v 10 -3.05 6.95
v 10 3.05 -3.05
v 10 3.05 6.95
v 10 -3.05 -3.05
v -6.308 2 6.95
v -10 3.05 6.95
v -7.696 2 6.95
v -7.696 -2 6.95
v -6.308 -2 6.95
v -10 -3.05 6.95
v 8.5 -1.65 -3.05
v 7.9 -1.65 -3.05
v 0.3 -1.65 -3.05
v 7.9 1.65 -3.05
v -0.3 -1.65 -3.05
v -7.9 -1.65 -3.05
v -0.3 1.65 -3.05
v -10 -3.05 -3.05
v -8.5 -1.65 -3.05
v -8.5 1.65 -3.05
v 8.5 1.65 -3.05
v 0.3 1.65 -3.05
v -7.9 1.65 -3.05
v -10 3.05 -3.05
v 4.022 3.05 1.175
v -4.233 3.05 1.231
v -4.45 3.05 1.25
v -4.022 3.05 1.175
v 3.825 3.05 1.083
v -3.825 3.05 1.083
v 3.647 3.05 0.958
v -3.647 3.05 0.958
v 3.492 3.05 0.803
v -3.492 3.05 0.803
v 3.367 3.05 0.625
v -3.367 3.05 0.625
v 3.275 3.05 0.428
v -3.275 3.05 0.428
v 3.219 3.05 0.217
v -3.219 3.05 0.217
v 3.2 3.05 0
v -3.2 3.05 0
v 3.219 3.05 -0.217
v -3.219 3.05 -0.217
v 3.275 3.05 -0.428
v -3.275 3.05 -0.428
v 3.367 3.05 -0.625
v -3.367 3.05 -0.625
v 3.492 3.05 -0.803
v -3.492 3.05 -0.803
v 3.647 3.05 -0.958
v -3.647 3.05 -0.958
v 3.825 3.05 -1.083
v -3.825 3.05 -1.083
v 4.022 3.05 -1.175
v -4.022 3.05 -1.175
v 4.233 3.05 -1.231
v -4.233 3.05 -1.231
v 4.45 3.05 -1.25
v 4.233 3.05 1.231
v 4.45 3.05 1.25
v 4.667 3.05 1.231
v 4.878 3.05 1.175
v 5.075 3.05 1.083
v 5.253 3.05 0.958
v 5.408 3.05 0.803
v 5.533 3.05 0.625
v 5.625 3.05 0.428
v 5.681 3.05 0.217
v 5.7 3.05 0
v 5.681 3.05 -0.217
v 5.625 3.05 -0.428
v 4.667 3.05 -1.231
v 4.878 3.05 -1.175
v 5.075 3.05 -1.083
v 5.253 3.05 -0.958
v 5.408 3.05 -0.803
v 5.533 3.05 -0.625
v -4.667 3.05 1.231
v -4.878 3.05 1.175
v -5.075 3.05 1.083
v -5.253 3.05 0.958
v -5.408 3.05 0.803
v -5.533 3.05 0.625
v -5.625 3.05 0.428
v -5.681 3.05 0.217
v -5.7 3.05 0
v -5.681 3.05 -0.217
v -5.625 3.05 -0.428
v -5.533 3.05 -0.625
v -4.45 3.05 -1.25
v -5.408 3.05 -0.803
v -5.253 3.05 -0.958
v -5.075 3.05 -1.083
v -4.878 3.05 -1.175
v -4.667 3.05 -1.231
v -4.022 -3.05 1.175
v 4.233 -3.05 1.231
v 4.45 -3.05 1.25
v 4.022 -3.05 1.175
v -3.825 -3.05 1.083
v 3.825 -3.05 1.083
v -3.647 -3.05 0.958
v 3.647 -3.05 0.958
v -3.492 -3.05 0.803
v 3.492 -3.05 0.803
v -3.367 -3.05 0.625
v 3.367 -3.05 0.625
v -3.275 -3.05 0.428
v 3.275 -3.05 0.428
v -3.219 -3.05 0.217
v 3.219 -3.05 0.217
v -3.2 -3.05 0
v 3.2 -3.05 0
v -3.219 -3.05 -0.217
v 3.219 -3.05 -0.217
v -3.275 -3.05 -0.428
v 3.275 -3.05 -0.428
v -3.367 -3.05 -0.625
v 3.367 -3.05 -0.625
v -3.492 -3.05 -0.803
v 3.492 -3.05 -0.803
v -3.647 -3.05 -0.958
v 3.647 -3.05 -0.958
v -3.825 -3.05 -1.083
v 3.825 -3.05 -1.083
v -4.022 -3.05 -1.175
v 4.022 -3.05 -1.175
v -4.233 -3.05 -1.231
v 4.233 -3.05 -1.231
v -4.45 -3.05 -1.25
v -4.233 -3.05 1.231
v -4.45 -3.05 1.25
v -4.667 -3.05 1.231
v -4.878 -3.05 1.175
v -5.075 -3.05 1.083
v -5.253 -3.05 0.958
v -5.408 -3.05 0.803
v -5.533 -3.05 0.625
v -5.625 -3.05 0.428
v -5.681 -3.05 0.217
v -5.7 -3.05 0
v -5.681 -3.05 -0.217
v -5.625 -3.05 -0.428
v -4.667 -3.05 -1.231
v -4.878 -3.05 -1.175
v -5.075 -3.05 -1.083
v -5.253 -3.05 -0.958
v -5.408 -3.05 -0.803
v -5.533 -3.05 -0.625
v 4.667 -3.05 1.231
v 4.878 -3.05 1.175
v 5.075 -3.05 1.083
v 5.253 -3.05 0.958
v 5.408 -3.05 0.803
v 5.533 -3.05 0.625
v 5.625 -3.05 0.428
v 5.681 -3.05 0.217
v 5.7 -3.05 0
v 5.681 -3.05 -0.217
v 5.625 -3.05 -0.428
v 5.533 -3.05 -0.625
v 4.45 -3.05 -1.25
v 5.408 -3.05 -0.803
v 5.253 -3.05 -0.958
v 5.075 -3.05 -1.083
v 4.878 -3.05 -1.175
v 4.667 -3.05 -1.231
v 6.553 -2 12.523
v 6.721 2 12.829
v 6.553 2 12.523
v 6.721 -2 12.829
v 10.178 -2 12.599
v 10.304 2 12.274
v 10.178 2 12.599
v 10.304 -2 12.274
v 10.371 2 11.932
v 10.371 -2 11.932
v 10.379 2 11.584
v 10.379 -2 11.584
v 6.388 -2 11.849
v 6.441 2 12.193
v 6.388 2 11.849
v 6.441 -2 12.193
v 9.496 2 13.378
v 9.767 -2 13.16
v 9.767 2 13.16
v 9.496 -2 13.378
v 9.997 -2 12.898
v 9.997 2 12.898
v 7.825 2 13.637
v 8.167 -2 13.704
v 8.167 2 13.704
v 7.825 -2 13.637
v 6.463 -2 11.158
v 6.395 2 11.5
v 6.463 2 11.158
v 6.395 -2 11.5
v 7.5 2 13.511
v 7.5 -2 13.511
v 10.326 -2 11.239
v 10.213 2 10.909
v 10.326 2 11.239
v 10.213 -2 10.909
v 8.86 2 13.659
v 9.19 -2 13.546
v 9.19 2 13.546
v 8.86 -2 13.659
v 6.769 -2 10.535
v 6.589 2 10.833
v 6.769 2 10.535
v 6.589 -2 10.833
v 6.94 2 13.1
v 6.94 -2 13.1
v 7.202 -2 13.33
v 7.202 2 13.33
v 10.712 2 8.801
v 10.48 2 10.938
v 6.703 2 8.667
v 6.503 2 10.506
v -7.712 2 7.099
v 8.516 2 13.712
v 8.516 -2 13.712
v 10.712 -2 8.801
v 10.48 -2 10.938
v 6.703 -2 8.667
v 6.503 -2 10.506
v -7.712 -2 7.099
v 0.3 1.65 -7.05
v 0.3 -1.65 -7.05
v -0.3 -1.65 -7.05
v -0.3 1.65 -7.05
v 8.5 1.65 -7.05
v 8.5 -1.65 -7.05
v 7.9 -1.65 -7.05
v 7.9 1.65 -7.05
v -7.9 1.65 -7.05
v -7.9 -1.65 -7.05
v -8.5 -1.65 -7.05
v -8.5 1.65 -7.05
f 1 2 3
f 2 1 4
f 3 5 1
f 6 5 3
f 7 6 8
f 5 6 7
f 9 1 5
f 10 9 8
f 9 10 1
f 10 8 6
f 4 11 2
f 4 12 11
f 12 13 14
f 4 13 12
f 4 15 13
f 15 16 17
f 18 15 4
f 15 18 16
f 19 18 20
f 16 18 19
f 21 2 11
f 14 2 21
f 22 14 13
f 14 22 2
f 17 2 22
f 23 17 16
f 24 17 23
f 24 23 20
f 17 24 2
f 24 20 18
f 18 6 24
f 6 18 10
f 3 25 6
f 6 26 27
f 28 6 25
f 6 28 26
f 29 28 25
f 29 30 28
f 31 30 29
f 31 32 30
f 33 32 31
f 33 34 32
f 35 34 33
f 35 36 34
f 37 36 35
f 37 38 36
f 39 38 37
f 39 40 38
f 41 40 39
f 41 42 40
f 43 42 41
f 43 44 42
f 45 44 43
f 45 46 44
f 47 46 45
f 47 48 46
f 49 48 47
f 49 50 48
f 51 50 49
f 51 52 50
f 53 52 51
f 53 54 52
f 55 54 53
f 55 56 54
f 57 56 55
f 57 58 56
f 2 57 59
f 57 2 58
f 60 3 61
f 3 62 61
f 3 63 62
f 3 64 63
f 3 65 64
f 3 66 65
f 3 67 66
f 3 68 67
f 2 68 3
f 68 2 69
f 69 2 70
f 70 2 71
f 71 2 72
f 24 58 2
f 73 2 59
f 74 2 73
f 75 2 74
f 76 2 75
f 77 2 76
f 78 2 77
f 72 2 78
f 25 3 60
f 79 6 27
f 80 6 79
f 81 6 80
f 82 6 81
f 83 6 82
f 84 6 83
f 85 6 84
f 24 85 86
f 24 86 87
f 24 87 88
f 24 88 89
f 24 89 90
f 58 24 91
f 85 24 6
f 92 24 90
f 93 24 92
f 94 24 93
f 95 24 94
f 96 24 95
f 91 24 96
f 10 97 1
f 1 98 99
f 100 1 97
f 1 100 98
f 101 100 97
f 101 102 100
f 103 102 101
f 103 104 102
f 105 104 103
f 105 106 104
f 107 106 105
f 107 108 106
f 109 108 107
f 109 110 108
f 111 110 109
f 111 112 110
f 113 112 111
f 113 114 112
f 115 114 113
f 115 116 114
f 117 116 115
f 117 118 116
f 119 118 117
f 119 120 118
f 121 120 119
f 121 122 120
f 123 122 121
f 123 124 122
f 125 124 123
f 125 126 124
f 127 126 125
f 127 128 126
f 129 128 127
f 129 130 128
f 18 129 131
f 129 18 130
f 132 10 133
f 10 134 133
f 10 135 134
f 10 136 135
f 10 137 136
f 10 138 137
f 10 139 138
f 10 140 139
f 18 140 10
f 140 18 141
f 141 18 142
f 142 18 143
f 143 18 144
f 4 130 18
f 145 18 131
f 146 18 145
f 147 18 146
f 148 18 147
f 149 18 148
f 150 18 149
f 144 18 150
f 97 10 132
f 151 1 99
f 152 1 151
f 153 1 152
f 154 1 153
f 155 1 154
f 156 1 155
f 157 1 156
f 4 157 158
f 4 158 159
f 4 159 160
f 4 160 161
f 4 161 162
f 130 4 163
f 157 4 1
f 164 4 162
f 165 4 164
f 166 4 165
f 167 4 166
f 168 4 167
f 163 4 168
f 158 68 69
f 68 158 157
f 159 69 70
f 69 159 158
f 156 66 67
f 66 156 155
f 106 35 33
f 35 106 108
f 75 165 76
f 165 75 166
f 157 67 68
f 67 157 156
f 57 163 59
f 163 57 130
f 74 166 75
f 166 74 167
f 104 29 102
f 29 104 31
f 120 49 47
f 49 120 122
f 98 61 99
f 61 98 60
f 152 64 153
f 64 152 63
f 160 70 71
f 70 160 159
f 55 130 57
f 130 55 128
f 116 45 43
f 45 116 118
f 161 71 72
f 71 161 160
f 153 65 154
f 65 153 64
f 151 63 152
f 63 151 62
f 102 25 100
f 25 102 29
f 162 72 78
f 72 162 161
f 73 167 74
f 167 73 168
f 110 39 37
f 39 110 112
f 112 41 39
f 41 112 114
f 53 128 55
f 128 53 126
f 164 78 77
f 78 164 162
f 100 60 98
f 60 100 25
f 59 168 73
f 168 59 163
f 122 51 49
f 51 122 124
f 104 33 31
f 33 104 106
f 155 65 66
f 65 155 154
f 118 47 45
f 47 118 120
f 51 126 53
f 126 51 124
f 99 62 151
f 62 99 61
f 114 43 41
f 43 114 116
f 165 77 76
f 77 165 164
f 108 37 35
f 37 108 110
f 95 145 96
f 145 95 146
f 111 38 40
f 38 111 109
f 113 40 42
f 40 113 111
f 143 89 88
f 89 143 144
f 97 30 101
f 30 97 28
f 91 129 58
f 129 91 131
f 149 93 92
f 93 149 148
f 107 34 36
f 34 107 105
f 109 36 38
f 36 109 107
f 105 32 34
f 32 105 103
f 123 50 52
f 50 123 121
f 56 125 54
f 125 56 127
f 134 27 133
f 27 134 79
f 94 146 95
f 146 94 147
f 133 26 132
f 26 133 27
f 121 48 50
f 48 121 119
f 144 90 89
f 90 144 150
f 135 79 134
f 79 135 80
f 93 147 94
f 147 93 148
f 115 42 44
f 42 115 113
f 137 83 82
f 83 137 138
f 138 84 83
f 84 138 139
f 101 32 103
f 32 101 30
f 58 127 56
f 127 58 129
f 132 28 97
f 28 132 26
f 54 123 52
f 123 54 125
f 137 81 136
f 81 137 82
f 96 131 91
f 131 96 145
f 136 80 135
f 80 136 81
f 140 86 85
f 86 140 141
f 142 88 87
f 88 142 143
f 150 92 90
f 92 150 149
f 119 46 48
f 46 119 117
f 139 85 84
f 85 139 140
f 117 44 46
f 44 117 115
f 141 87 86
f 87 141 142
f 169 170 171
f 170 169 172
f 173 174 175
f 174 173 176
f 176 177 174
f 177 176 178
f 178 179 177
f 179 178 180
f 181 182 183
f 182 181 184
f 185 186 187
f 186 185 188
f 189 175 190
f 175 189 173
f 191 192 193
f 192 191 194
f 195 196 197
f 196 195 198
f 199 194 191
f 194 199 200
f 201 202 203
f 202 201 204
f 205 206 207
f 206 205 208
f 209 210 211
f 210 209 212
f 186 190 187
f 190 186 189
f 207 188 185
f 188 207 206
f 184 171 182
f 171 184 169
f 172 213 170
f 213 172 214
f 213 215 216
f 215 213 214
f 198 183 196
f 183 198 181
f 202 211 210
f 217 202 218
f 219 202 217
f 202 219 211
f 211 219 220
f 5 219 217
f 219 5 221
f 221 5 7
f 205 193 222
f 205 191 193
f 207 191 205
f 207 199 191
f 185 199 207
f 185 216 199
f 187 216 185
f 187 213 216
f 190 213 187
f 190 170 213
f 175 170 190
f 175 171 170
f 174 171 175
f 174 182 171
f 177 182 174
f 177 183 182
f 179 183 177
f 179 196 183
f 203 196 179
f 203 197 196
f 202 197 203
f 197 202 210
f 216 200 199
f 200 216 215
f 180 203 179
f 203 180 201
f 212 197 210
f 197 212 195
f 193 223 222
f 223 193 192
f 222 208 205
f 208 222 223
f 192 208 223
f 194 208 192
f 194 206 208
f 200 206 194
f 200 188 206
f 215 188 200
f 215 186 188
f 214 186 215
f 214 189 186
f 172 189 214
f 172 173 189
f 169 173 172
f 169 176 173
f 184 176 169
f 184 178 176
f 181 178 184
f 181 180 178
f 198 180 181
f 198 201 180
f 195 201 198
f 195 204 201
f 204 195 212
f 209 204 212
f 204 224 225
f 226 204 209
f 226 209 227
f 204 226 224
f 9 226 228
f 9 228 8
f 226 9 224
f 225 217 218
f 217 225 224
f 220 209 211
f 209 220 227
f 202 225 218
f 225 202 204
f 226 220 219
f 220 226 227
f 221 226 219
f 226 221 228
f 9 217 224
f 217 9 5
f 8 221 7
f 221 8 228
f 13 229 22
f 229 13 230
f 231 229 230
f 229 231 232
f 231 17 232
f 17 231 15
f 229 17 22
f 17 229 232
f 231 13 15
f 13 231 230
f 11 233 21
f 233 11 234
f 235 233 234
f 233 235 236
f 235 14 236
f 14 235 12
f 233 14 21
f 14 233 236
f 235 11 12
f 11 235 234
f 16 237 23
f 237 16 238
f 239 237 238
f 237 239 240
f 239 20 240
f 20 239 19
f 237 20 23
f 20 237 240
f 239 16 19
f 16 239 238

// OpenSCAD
/*
  Micro switch with roller

  Aaron Ciuffo (txoof)
  23 December 2015


*/
$fn=36; //curve refinement

/*[body]*/
// body X
bX=20;  
// body Y
bY=6.1;
// body Z
bZ=10;
// hole diameter
hD=2.5; 
holeFromBottom=1.8; //absolute distance of mounting hole from bottom of switch
holeFromEdge=4.3; //absolute distance of mounting hole from edge

/*[terminals]*/
// terminal X dimension
tX=.6;
// terminal Y dimension
tY=3.3;
// terminal Z dimension
tZ=4;
// position from edge
termFromEdge=1.5;


/*[switch arm]*/
//arm X
aX=18.5;
// arm Y
aY=4;
// arm Z
aZ=.3;
 //absolute distance of arm from edge
armFromEdge=3;
//absolute distance of roller over the arm
rollerOverArm=1;
//distance of arm over body
armOverBody=4;  
// add a roller
addRoller=1; //[0:1]
// roller diameter
rollerD=4;

/*[Hidden]*/
hR=hD/2; 
echo(hR);
hZ=bZ/2-hR-holeFromBottom; //place the hole
hX=bX/2-hR-holeFromEdge;
//hY=bX/2-hR-holeFromEdge;
rollerR=rollerD/2;
armAngle=asin(armOverBody/aX/2);

module body() {
  difference() {
    color("gray")
      cube([bX, bY, bZ], center=true);
    rotate([90, 0, 0])
      translate([hX, -hZ, 0])
      cylinder(r=hR, h=bY*1.5, center=true);
    rotate([90, 0, 0])
      translate([-hX, -hZ, 0])
        cylinder(r=hR, h=bY*1.5, center=true);
  }
}

module arm() {
  color("silver")
  union() {
    rotate([])
      cube([aX, aY, aZ], center=true);
    if (addRoller==1) {
      translate([aX/2-rollerR, 0, rollerR+rollerOverArm])
        rotate([90, 0, 0])
        cylinder(h=aY, r=rollerR, center=true);
      translate([aX/2-rollerR, 0, rollerR/2])
        cube([rollerD, rollerD, rollerR], center=true);
    }
  
  }
}

module terminals() {
  translate([0, 0, -bZ/2-tZ/2])
    cube([tX, tY, tZ], center=true);
  translate([bX/2-tX/2-termFromEdge, 0, -bZ/2-tZ/2])
    cube([tX, tY, tZ], center=true);
  translate([-1*(bX/2-tX/2-termFromEdge), 0, -bZ/2-tZ/2])
    cube([tX, tY, tZ], center=true);
}

module micro_switch() {
  //center on holes
  translate([0, 0, hZ])
  union() {
    body();
    translate([armFromEdge/2, 0, bZ/2+armOverBody/4])
      rotate([0, -armAngle, 0])
      arm();
    color("silver")
      terminals();
  }  
}

micro_switch();
